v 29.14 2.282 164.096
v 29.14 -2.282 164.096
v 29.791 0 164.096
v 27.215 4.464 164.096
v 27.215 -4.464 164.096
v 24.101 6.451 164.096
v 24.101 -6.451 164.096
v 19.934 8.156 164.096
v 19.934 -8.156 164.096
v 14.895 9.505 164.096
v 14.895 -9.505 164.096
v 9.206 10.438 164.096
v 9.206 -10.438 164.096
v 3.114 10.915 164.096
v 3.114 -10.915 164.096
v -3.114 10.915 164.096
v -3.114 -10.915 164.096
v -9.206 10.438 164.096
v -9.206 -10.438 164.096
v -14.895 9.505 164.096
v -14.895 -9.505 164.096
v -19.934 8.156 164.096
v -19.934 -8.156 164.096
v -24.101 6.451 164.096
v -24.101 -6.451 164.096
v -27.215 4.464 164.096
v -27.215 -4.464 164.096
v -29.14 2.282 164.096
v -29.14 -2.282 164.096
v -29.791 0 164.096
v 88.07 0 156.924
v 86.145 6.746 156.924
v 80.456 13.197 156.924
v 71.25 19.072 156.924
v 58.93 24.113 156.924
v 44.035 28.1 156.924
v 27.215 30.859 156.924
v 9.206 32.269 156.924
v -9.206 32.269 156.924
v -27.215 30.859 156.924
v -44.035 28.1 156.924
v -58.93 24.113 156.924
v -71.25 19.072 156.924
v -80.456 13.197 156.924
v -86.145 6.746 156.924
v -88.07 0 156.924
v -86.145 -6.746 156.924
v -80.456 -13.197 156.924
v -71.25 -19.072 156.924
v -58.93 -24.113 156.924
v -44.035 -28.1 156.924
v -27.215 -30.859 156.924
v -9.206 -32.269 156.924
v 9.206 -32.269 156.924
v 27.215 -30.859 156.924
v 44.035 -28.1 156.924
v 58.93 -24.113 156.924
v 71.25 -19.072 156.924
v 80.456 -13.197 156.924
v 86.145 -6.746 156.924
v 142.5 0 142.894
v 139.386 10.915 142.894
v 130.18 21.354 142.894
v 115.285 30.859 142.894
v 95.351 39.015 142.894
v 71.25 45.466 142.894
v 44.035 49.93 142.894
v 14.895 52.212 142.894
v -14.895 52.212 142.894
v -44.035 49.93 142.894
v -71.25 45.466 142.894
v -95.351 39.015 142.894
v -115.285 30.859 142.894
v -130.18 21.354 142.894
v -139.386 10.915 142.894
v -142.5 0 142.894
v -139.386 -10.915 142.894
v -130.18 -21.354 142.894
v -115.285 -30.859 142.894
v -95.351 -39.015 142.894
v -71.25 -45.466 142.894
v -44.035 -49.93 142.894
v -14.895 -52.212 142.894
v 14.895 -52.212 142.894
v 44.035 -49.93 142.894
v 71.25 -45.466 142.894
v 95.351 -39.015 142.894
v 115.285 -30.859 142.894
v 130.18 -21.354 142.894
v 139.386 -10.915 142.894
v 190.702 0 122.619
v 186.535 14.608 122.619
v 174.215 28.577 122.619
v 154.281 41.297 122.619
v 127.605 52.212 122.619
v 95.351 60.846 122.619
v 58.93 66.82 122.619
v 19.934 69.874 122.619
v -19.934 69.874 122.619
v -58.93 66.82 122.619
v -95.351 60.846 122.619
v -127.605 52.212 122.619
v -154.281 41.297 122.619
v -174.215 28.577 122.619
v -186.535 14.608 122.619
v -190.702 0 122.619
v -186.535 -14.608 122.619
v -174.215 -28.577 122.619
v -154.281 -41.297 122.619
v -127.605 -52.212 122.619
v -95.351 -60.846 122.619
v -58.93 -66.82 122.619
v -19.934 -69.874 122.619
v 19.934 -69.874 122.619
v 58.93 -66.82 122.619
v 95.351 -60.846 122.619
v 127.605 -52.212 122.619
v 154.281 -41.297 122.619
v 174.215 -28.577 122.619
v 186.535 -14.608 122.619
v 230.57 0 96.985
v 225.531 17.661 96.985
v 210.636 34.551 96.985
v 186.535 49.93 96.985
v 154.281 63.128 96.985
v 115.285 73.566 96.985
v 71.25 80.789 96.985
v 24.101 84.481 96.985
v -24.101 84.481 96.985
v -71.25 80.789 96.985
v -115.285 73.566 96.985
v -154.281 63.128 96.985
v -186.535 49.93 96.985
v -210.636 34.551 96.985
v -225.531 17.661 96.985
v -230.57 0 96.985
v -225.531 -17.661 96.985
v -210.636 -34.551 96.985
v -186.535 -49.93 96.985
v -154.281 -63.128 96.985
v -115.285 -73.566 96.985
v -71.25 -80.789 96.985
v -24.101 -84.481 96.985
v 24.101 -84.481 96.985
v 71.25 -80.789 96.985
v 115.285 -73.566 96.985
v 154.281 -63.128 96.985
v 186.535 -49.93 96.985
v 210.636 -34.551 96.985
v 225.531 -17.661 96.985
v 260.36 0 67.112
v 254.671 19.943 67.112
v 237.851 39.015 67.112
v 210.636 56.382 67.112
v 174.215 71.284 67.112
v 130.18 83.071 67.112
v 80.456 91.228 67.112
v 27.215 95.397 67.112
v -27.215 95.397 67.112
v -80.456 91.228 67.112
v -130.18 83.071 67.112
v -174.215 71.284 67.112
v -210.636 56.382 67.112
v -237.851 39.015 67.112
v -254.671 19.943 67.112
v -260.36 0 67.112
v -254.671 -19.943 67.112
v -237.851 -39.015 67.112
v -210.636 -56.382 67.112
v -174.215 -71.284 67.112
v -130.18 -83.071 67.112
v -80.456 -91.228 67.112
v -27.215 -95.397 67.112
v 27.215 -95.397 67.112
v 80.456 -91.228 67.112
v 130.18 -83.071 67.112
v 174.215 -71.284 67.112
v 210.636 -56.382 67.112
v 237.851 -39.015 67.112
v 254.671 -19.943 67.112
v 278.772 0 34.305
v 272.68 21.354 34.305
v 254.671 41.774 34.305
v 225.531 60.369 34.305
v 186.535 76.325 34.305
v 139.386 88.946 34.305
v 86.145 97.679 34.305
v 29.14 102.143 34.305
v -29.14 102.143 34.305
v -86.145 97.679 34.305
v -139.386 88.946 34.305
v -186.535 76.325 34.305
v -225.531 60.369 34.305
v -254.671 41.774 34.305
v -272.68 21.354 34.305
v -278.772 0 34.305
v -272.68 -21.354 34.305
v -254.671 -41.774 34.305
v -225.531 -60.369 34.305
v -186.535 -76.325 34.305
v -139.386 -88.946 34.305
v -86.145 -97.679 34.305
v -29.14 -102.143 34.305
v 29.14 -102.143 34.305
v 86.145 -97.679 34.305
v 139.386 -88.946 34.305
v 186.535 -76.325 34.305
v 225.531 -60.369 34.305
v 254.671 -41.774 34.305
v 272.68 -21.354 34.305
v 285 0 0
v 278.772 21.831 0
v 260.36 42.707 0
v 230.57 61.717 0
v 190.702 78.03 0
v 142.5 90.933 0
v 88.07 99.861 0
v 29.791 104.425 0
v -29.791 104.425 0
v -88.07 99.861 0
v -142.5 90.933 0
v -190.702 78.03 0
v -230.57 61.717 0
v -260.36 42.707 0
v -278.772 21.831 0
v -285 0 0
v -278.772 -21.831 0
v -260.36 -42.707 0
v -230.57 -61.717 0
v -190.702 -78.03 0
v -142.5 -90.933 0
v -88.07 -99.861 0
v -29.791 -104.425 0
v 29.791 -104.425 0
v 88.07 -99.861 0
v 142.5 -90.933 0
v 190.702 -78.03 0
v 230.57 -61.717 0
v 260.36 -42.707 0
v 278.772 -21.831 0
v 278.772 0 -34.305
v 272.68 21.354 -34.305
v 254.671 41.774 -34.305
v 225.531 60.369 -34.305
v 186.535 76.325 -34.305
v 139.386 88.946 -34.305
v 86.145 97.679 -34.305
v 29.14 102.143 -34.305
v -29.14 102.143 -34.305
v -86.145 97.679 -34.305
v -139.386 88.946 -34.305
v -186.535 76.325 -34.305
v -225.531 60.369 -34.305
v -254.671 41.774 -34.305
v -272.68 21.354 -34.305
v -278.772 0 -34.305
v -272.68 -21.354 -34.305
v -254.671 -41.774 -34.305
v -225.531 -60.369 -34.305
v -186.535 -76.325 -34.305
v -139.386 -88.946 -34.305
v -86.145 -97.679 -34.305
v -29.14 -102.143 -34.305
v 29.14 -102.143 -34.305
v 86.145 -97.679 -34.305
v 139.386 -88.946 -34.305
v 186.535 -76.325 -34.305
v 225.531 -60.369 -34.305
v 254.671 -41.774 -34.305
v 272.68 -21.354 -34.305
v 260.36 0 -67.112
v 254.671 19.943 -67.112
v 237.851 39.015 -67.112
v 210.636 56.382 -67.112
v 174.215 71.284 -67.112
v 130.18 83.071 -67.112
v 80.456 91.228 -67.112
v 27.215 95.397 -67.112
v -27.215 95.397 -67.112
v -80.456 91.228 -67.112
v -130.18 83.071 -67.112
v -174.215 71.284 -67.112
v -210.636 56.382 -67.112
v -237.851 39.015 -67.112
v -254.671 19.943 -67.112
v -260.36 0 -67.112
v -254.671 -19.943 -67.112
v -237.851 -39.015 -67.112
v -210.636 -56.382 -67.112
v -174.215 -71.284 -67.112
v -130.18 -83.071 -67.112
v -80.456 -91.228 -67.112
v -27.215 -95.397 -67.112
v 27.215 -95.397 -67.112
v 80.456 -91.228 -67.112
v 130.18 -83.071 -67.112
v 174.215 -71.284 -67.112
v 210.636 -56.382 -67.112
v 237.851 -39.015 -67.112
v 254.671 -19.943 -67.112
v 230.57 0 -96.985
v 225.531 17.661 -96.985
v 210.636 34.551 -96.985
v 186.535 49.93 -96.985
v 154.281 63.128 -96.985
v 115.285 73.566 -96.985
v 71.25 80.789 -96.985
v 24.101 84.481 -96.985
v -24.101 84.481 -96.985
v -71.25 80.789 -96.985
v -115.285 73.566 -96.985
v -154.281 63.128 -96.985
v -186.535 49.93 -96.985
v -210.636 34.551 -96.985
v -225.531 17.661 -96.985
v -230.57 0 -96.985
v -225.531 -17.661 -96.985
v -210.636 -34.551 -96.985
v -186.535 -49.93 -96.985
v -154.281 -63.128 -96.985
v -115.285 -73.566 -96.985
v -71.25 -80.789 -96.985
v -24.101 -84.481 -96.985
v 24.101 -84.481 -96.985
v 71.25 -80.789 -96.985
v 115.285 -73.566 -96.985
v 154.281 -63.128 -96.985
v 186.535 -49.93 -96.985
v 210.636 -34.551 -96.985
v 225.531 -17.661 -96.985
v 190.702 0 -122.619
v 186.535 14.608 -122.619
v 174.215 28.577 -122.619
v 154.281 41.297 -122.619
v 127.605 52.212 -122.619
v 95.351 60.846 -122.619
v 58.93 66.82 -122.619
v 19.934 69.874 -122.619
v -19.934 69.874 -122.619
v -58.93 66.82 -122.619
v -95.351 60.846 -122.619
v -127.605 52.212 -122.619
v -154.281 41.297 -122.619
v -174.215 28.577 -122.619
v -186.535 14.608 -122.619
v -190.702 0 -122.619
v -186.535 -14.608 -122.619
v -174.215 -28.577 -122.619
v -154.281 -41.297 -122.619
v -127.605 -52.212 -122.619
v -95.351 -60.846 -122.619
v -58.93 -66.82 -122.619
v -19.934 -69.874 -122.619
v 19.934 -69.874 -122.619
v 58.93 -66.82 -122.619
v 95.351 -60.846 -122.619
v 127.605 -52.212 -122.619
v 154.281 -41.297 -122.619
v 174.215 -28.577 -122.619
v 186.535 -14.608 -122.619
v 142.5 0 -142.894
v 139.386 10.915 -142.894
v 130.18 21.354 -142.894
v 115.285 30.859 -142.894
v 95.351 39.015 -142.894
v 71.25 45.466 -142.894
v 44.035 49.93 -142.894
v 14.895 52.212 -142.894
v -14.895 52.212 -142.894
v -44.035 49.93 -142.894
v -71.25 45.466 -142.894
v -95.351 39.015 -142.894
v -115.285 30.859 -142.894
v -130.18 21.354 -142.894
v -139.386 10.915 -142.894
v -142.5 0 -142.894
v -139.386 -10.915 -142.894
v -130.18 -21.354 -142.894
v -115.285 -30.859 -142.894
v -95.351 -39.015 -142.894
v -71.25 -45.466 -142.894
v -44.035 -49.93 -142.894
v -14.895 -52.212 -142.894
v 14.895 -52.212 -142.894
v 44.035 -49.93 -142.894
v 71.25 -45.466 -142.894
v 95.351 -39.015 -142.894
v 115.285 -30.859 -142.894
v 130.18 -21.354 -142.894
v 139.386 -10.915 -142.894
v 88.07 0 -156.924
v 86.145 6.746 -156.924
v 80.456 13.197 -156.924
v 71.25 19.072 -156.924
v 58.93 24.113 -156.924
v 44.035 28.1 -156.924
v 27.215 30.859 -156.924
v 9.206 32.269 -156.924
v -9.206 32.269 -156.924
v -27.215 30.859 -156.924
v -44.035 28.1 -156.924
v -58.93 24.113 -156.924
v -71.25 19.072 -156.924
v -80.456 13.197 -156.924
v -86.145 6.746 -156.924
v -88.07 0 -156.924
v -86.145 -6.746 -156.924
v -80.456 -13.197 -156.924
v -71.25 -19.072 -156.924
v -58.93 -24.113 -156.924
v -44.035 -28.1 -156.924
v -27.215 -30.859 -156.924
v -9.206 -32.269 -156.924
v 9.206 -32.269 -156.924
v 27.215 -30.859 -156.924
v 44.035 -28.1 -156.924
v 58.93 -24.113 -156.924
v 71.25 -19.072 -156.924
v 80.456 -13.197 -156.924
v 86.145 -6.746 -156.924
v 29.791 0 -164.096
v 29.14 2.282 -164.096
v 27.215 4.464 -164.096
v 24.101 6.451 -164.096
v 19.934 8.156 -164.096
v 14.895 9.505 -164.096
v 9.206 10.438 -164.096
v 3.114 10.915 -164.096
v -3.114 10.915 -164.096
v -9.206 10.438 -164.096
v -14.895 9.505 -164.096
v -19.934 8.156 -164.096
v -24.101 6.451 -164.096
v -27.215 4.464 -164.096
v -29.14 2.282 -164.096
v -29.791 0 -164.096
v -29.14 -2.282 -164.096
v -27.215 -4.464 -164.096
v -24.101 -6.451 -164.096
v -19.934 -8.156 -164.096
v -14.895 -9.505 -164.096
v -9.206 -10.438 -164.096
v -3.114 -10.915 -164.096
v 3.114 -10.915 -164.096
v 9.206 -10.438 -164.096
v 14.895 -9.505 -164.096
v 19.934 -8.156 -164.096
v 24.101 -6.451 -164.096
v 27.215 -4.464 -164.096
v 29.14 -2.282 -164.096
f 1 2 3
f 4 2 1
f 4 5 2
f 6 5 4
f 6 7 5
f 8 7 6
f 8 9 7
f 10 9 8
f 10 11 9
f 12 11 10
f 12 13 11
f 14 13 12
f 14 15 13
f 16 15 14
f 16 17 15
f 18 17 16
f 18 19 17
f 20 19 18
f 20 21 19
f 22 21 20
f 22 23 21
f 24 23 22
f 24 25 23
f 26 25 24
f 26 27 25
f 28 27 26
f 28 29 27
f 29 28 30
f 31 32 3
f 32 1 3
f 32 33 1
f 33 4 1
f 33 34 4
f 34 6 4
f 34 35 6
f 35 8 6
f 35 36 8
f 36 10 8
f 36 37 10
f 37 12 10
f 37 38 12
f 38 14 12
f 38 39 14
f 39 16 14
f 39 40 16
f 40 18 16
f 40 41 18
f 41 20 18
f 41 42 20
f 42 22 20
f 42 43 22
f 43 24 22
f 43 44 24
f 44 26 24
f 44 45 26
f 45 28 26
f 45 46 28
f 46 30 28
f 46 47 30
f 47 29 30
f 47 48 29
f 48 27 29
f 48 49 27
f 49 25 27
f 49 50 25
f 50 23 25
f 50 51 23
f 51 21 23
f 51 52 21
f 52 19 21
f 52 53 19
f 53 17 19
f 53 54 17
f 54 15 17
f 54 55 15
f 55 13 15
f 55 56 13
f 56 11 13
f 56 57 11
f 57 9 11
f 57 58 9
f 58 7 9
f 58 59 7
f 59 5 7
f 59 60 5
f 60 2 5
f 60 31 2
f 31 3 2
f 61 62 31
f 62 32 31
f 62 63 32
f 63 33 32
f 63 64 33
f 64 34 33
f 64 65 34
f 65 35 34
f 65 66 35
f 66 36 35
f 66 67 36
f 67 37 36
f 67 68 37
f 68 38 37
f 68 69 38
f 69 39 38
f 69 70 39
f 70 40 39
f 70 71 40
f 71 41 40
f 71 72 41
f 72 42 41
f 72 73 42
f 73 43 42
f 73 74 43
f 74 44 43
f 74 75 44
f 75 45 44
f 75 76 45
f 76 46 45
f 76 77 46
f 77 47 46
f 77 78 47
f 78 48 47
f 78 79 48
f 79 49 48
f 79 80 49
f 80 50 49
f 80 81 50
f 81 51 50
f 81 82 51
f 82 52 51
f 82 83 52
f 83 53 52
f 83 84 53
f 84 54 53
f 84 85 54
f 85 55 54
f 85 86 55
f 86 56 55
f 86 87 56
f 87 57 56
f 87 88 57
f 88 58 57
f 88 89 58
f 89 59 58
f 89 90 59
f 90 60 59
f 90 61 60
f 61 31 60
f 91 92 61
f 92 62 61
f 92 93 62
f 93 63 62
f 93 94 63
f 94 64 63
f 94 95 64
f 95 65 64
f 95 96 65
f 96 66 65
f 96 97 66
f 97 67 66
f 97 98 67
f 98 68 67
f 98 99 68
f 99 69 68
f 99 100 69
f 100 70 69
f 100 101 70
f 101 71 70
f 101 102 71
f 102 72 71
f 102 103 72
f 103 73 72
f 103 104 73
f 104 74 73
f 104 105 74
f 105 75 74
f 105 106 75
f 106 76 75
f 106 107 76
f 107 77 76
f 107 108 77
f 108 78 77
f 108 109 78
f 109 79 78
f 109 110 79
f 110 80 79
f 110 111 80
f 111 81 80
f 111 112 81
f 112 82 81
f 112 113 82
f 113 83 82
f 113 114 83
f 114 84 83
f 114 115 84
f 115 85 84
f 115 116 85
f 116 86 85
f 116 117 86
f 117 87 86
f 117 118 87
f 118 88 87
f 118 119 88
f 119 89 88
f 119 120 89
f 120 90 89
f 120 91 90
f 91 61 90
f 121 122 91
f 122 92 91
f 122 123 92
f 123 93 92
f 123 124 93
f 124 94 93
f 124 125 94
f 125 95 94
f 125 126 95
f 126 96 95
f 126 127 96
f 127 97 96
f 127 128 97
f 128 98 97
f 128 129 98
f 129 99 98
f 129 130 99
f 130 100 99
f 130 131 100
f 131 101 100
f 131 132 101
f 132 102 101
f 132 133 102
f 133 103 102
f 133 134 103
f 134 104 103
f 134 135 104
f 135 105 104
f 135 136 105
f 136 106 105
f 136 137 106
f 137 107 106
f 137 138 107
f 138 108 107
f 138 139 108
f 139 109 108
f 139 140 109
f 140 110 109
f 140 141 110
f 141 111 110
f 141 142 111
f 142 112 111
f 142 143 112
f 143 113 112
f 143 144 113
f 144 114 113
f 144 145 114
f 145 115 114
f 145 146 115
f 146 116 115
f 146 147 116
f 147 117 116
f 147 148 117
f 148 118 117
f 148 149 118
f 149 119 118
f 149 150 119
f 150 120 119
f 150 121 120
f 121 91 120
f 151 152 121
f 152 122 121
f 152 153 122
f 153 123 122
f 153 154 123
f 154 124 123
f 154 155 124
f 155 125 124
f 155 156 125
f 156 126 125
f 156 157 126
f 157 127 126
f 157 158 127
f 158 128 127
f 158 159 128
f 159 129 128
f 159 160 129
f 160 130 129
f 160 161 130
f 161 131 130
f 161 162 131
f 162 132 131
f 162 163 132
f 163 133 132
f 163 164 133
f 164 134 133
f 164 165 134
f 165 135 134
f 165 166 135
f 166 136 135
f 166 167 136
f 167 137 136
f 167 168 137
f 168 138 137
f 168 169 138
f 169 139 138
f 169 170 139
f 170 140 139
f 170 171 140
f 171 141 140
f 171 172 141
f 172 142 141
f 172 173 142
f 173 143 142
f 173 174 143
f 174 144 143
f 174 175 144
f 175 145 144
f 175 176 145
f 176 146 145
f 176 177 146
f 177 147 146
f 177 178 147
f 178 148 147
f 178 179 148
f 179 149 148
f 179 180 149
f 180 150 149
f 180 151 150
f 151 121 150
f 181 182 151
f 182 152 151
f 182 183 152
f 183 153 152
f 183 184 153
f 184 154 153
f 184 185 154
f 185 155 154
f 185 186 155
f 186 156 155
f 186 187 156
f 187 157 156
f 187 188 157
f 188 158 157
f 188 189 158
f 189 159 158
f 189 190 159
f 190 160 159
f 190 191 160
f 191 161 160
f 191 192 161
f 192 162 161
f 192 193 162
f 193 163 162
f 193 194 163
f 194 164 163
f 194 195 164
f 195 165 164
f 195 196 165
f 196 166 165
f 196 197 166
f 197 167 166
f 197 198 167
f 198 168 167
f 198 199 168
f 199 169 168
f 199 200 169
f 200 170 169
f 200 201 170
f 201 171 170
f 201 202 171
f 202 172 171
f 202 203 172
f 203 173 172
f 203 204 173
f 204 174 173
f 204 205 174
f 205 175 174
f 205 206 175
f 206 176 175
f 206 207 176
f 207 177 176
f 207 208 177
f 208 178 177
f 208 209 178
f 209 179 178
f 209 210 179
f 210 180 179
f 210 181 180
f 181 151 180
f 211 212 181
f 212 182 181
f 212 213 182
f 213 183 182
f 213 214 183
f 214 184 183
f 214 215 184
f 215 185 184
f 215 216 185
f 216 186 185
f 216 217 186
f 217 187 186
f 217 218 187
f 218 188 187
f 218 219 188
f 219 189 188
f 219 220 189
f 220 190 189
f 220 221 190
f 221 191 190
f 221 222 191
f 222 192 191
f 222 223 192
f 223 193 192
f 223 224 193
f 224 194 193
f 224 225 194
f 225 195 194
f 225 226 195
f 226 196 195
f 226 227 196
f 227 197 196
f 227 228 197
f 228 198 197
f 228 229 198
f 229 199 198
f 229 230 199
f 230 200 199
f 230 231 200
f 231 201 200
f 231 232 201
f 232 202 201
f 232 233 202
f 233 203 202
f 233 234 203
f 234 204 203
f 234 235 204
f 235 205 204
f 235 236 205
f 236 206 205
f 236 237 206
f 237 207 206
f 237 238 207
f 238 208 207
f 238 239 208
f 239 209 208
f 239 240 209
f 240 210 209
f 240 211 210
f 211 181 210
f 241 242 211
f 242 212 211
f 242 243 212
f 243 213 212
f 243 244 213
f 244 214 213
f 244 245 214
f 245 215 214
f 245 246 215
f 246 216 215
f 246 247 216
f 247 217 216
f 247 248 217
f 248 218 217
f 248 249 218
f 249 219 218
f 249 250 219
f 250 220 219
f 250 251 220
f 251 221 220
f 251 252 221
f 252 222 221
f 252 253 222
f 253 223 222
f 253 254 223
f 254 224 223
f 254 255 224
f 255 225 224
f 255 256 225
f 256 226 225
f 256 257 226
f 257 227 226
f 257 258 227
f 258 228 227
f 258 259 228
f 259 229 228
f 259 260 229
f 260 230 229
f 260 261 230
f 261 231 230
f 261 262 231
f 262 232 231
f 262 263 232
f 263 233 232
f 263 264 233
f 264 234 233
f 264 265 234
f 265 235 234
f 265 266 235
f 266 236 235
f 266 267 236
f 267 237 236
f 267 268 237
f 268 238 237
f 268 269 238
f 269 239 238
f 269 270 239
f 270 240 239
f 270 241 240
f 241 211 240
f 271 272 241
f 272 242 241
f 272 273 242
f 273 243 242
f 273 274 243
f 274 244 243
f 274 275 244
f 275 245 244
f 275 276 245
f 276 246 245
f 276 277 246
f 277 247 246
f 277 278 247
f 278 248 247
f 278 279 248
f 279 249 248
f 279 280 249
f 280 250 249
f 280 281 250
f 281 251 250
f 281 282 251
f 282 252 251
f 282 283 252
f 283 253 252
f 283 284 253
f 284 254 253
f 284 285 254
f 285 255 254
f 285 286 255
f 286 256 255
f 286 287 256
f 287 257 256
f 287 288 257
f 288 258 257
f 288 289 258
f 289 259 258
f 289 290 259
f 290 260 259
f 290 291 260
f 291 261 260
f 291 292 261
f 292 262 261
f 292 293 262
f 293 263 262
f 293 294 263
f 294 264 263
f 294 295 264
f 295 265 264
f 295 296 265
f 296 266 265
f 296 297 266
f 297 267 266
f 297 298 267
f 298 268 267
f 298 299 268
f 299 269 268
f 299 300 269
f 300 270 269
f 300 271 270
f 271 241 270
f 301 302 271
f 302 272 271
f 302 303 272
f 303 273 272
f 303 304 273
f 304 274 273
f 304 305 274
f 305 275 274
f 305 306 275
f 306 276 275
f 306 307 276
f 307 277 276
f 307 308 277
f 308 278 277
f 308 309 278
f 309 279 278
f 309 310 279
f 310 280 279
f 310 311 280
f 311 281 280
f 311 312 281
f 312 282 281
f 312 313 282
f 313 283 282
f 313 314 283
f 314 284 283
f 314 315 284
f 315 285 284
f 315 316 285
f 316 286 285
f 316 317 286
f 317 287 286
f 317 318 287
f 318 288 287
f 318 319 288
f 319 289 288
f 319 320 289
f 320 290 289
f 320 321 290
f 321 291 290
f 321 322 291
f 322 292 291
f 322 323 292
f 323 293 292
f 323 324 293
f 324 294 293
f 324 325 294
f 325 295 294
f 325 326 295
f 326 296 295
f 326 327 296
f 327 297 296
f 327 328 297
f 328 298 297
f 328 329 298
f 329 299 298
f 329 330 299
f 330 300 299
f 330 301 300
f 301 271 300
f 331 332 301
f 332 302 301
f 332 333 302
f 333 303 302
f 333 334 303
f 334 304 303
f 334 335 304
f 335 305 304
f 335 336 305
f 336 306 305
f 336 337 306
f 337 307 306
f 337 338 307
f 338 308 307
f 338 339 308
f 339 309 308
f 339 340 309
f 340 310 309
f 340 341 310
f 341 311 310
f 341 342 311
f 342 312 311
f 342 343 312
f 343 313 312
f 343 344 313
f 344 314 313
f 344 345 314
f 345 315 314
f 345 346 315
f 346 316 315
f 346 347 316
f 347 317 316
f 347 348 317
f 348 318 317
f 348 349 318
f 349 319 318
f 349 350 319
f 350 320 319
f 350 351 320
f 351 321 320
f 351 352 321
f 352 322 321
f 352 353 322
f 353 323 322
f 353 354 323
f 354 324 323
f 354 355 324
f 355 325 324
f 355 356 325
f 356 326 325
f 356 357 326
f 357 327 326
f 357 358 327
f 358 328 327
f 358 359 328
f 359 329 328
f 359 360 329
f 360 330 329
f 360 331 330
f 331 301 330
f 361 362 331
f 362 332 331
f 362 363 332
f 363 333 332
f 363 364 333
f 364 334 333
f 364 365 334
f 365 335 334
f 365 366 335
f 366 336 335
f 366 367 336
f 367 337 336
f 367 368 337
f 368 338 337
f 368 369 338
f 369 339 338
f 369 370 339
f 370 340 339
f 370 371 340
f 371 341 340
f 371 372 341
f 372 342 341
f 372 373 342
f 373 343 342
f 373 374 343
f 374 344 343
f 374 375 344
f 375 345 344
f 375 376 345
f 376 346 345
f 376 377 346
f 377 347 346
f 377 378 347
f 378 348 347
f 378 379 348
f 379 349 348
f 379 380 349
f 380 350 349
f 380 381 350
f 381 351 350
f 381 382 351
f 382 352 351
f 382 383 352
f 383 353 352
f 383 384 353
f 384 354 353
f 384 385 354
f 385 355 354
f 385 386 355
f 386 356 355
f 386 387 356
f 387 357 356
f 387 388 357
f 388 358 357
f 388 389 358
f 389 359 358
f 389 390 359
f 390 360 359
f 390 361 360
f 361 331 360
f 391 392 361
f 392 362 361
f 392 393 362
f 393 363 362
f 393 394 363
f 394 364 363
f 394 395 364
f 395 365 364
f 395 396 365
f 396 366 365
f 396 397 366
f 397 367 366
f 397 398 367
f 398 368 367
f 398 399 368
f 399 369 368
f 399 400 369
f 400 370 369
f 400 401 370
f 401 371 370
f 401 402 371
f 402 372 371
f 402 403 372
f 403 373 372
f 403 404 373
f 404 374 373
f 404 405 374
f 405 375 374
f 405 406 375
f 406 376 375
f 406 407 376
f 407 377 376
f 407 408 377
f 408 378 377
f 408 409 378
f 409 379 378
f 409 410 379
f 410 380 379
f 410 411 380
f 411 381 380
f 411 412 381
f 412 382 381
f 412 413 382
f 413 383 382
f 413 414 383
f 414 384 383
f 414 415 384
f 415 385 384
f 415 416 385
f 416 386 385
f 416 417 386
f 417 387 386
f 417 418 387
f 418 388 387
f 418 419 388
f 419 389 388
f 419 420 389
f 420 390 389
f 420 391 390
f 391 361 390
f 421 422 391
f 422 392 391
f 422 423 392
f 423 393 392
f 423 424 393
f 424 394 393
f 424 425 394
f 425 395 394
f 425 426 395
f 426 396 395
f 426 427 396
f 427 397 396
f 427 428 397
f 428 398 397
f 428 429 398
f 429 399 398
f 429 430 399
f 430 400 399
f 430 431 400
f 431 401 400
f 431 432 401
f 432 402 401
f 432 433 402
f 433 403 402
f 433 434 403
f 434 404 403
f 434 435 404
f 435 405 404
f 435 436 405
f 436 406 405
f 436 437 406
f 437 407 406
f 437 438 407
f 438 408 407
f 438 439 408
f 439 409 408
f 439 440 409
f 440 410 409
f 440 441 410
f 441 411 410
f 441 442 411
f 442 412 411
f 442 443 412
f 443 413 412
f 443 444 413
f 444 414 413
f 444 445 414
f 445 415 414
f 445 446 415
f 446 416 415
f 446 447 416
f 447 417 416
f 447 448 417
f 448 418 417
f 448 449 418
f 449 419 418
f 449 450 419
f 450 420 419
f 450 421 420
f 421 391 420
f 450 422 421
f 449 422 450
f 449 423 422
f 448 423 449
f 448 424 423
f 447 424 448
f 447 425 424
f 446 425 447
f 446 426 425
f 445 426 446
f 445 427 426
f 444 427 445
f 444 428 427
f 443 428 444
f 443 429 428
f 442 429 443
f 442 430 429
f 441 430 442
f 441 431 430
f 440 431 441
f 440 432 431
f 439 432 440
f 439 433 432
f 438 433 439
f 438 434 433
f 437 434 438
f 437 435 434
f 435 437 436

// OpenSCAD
// Generated by SolidPython 1.0.1 on 2020-07-29 00:46:53


scale(v = [19, 7, 11]) {
	sphere(r = 15);
}
/***********************************************
*********      SolidPython code:      **********
************************************************
 
# import packages: SolidPython
from solid import *
from solid.utils import *
from itertools import chain, combinations, permutations


class Resize:

    def __init__(self, scad_file):
        self.scad_file = scad_file
        #self.scad_file = import_scad(scad_file)
        # cone/cylinder param:
        self.r1 = 0
        self.r2 = 0
        self.h = 0
        # rectangular prism param:
        self.w = 0
        self.l = 0
        # ellipse param:
        self.r = 0

    # import OpenScad code (file name corresponds to shape)


    # classify shape + parameters
    def assign(self, param1, param2, param3):
        if self.scad_file == 'cone.scad':
            self.r1 = param1
            self.r2 = param2
            self.h = param3
        elif self.scad_file == 'cylinder.scad':
            self.r1 = param1
            self.r2 = param2
            self.h = param3
        elif self.scad_file == 'rectangularPrism.scad':
            self.h = param1
            self.l = param2
            self.w = param3
        else:
            self.r = param1
            self.h = param2

    # resize parameters
    def iterate(self):
        x = range(3, 20, 2)
        i = 1
        if self.scad_file == 'cone.scad':
            tempList = list(permutations(x, 2))
            for temp in tempList:
                param1 = temp[0]
                param2 = temp[1]
                filepath = 'produced_scad_files/' + 'cone' + str(param1) + '_' + str(param2) + '_' + '.scad'
                scad_render_to_file(cylinder(h=param1, r1=param2, r2=0), filepath)

        elif self.scad_file == 'cylinder.scad':
            tempList = list(permutations(x, 3))
            for temp in tempList:
                param1 = temp[0]
                param2 = temp[1]
                filepath = 'produced_scad_files/' + 'cylinder' + str(param1) + '_' + str(param2) + '_' + '.scad'
                scad_render_to_file(cylinder(h=param1, r1=param2, r2=param2), filepath)

        elif self.scad_file == 'rectangularPrism.scad':
            tempList = list(permutations(x, 3))
            for temp in tempList:
                param1 = temp[0]
                param2 = temp[1]
                param3 = temp[2]
                filepath = 'produced_scad_files/' + 'rectangularPrism' + str(param1) + '_' + str(param2) + '_' + str(
                    param3) + '.scad'
                scad_render_to_file(cube(size=(param1, param2, param3)), filepath)

        elif self.scad_file == 'ellipse.scad':
            tempList = list(permutations(x, 4))
            for temp in tempList:
                param1 = temp[0]
                param2 = temp[1]
                param3 = temp[2]
                param4 = temp[3]
                filepath = 'produced_scad_files/' + 'ellipse' + str(param1) + '_' + str(param2) + '_' + str(param3) + '_' + str(param4) + '.scad'
                scad_render_to_file(scale([param1, param2, param3])(sphere(r=param4)), filepath)

    def render_to_scadfile(self):
        scad_render_to_file(scad, 'example.scad') 
 
************************************************/
